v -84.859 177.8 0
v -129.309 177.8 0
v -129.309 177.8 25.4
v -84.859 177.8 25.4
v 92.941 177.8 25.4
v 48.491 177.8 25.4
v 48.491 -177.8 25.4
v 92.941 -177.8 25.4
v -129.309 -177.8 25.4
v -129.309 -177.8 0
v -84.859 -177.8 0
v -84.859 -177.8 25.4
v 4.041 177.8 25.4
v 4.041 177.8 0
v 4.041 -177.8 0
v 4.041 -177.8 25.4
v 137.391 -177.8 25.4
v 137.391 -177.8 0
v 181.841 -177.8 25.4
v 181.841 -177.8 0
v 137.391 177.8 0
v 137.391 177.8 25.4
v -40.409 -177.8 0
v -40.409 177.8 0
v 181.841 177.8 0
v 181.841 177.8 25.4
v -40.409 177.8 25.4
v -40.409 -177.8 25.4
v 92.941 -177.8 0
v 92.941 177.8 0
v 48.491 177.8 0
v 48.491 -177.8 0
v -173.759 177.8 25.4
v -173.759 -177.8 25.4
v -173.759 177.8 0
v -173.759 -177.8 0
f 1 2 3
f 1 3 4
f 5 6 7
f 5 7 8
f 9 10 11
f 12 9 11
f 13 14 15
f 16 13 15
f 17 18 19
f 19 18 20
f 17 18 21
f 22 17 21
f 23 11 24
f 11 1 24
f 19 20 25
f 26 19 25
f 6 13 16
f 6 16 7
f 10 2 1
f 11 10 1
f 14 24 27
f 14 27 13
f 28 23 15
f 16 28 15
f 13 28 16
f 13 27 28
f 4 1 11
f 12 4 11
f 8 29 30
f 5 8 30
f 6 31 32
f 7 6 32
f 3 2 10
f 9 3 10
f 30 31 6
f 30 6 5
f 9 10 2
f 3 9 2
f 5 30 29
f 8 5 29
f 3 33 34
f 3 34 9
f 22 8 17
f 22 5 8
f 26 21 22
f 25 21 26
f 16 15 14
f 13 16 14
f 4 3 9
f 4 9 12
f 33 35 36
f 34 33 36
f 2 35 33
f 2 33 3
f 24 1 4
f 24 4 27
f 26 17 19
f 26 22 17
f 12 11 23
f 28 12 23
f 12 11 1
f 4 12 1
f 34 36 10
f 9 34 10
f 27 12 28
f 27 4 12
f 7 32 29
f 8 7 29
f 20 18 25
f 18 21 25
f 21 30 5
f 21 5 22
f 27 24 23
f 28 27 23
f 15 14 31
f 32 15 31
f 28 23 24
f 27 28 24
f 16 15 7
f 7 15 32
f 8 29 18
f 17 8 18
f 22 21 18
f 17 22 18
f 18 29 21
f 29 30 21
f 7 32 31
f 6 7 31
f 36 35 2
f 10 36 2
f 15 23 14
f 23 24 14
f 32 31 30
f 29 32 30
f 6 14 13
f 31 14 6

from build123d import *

# Parameters (mm, degrees)
F0_W     = 44.45
F0_H     = 44.45
F1_DEPTH = 25.4
F2_DEPTH = 25.4


with BuildPart() as f1:
    # F0 (on Top) → F1 (new body)
    with BuildSketch(Plane.XY):
        with Locations((-151.5340909091, 155.575)):
            Rectangle(F0_W, F0_H)
        with Locations((-151.5340909091, 111.125)):
            Rectangle(F0_W, F0_H)
        with Locations((-151.5340909091, 66.675)):
            Rectangle(F0_W, F0_H)
        with Locations((-151.5340909091, -22.225)):
            Rectangle(F0_W, F0_H)
        with Locations((-151.5340909091, -66.675)):
            Rectangle(F0_W, F0_H)
        with Locations((-151.5340909091, 22.225)):
            Rectangle(F0_W, F0_H)
        with Locations((-151.5340909091, -111.125)):
            Rectangle(F0_W, F0_H)
        with Locations((-151.5340909091, -155.575)):
            Rectangle(F0_W, F0_H)
    extrude(amount=F1_DEPTH)


with BuildPart() as f1b:
    # F0 (on Top) → F1, piece 2 (new body)
    with BuildSketch(Plane.XY):
        with Locations((-62.6340909091, -155.575)):
            Rectangle(F0_W, F0_H)
        with Locations((-62.6340909091, -111.125)):
            Rectangle(F0_W, F0_H)
        with Locations((-62.6340909091, -66.675)):
            Rectangle(F0_W, F0_H)
        with Locations((-62.6340909091, -22.225)):
            Rectangle(F0_W, F0_H)
        with Locations((-62.6340909091, 22.225)):
            Rectangle(F0_W, F0_H)
        with Locations((-62.6340909091, 66.675)):
            Rectangle(F0_W, F0_H)
        with Locations((-62.6340909091, 111.125)):
            Rectangle(F0_W, F0_H)
        with Locations((-62.6340909091, 155.575)):
            Rectangle(F0_W, F0_H)
    extrude(amount=F1_DEPTH)


with BuildPart() as f1c:
    # F0 (on Top) → F1, piece 3 (new body)
    with BuildSketch(Plane.XY):
        with Locations((26.2659090909, 155.575)):
            Rectangle(F0_W, F0_H)
        with Locations((26.2659090909, 111.125)):
            Rectangle(F0_W, F0_H)
        with Locations((26.2659090909, 66.675)):
            Rectangle(F0_W, F0_H)
        with Locations((26.2659090909, 22.225)):
            Rectangle(F0_W, F0_H)
        with Locations((26.2659090909, -22.225)):
            Rectangle(F0_W, F0_H)
        with Locations((26.2659090909, -66.675)):
            Rectangle(F0_W, F0_H)
        with Locations((26.2659090909, -111.125)):
            Rectangle(F0_W, F0_H)
        with Locations((26.2659090909, -155.575)):
            Rectangle(F0_W, F0_H)
    extrude(amount=F1_DEPTH)


with BuildPart() as f1d:
    # F0 (on Top) → F1, piece 4 (new body)
    with BuildSketch(Plane.XY):
        with Locations((115.1659090909, -155.575)):
            Rectangle(F0_W, F0_H)
        with Locations((115.1659090909, -111.125)):
            Rectangle(F0_W, F0_H)
        with Locations((115.1659090909, -66.675)):
            Rectangle(F0_W, F0_H)
        with Locations((115.1659090909, -22.225)):
            Rectangle(F0_W, F0_H)
        with Locations((115.1659090909, 22.225)):
            Rectangle(F0_W, F0_H)
        with Locations((115.1659090909, 66.675)):
            Rectangle(F0_W, F0_H)
        with Locations((115.1659090909, 111.125)):
            Rectangle(F0_W, F0_H)
        with Locations((115.1659090909, 155.575)):
            Rectangle(F0_W, F0_H)
    extrude(amount=F1_DEPTH)


with BuildPart() as f2:
    # F0 (on Top) → F2 (new body)
    with BuildSketch(Plane.XY):
        with Locations((-107.0840909091, 155.575)):
            Rectangle(F0_W, F0_H)
        with Locations((-107.0840909091, 111.125)):
            Rectangle(F0_W, F0_H)
        with Locations((-107.0840909091, 66.675)):
            Rectangle(F0_W, F0_H)
        with Locations((-107.0840909091, 22.225)):
            Rectangle(F0_W, F0_H)
        with Locations((-107.0840909091, -22.225)):
            Rectangle(F0_W, F0_H)
        with Locations((-107.0840909091, -66.675)):
            Rectangle(F0_W, F0_H)
        with Locations((-107.0840909091, -111.125)):
            Rectangle(F0_W, F0_H)
        with Locations((-107.0840909091, -155.575)):
            Rectangle(F0_W, F0_H)
    extrude(amount=F2_DEPTH)


with BuildPart() as f2b:
    # F0 (on Top) → F2, piece 2 (new body)
    with BuildSketch(Plane.XY):
        with Locations((-18.1840909091, -155.575)):
            Rectangle(F0_W, F0_H)
        with Locations((-18.1840909091, -111.125)):
            Rectangle(F0_W, F0_H)
        with Locations((-18.1840909091, -66.675)):
            Rectangle(F0_W, F0_H)
        with Locations((-18.1840909091, -22.225)):
            Rectangle(F0_W, F0_H)
        with Locations((-18.1840909091, 22.225)):
            Rectangle(F0_W, F0_H)
        with Locations((-18.1840909091, 66.675)):
            Rectangle(F0_W, F0_H)
        with Locations((-18.1840909091, 111.125)):
            Rectangle(F0_W, F0_H)
        with Locations((-18.1840909091, 155.575)):
            Rectangle(F0_W, F0_H)
    extrude(amount=F2_DEPTH)


with BuildPart() as f2c:
    # F0 (on Top) → F2, piece 3 (new body)
    with BuildSketch(Plane.XY):
        with Locations((70.7159090909, 155.575)):
            Rectangle(F0_W, F0_H)
        with Locations((70.7159090909, 111.125)):
            Rectangle(F0_W, F0_H)
        with Locations((70.7159090909, 66.675)):
            Rectangle(F0_W, F0_H)
        with Locations((70.7159090909, 22.225)):
            Rectangle(F0_W, F0_H)
        with Locations((70.7159090909, -22.225)):
            Rectangle(F0_W, F0_H)
        with Locations((70.7159090909, -66.675)):
            Rectangle(F0_W, F0_H)
        with Locations((70.7159090909, -111.125)):
            Rectangle(F0_W, F0_H)
        with Locations((70.7159090909, -155.575)):
            Rectangle(F0_W, F0_H)
    extrude(amount=F2_DEPTH)


with BuildPart() as f2d:
    # F0 (on Top) → F2, piece 4 (new body)
    with BuildSketch(Plane.XY):
        with Locations((159.6159090909, -155.575)):
            Rectangle(F0_W, F0_H)
        with Locations((159.6159090909, -111.125)):
            Rectangle(F0_W, F0_H)
        with Locations((159.6159090909, -66.675)):
            Rectangle(F0_W, F0_H)
        with Locations((159.6159090909, -22.225)):
            Rectangle(F0_W, F0_H)
        with Locations((159.6159090909, 22.225)):
            Rectangle(F0_W, F0_H)
        with Locations((159.6159090909, 66.675)):
            Rectangle(F0_W, F0_H)
        with Locations((159.6159090909, 111.125)):
            Rectangle(F0_W, F0_H)
        with Locations((159.6159090909, 155.575)):
            Rectangle(F0_W, F0_H)
    extrude(amount=F2_DEPTH)


solid = Compound([f1.part, f1b.part, f1c.part, f1d.part, f2.part, f2b.part, f2c.part, f2d.part])
